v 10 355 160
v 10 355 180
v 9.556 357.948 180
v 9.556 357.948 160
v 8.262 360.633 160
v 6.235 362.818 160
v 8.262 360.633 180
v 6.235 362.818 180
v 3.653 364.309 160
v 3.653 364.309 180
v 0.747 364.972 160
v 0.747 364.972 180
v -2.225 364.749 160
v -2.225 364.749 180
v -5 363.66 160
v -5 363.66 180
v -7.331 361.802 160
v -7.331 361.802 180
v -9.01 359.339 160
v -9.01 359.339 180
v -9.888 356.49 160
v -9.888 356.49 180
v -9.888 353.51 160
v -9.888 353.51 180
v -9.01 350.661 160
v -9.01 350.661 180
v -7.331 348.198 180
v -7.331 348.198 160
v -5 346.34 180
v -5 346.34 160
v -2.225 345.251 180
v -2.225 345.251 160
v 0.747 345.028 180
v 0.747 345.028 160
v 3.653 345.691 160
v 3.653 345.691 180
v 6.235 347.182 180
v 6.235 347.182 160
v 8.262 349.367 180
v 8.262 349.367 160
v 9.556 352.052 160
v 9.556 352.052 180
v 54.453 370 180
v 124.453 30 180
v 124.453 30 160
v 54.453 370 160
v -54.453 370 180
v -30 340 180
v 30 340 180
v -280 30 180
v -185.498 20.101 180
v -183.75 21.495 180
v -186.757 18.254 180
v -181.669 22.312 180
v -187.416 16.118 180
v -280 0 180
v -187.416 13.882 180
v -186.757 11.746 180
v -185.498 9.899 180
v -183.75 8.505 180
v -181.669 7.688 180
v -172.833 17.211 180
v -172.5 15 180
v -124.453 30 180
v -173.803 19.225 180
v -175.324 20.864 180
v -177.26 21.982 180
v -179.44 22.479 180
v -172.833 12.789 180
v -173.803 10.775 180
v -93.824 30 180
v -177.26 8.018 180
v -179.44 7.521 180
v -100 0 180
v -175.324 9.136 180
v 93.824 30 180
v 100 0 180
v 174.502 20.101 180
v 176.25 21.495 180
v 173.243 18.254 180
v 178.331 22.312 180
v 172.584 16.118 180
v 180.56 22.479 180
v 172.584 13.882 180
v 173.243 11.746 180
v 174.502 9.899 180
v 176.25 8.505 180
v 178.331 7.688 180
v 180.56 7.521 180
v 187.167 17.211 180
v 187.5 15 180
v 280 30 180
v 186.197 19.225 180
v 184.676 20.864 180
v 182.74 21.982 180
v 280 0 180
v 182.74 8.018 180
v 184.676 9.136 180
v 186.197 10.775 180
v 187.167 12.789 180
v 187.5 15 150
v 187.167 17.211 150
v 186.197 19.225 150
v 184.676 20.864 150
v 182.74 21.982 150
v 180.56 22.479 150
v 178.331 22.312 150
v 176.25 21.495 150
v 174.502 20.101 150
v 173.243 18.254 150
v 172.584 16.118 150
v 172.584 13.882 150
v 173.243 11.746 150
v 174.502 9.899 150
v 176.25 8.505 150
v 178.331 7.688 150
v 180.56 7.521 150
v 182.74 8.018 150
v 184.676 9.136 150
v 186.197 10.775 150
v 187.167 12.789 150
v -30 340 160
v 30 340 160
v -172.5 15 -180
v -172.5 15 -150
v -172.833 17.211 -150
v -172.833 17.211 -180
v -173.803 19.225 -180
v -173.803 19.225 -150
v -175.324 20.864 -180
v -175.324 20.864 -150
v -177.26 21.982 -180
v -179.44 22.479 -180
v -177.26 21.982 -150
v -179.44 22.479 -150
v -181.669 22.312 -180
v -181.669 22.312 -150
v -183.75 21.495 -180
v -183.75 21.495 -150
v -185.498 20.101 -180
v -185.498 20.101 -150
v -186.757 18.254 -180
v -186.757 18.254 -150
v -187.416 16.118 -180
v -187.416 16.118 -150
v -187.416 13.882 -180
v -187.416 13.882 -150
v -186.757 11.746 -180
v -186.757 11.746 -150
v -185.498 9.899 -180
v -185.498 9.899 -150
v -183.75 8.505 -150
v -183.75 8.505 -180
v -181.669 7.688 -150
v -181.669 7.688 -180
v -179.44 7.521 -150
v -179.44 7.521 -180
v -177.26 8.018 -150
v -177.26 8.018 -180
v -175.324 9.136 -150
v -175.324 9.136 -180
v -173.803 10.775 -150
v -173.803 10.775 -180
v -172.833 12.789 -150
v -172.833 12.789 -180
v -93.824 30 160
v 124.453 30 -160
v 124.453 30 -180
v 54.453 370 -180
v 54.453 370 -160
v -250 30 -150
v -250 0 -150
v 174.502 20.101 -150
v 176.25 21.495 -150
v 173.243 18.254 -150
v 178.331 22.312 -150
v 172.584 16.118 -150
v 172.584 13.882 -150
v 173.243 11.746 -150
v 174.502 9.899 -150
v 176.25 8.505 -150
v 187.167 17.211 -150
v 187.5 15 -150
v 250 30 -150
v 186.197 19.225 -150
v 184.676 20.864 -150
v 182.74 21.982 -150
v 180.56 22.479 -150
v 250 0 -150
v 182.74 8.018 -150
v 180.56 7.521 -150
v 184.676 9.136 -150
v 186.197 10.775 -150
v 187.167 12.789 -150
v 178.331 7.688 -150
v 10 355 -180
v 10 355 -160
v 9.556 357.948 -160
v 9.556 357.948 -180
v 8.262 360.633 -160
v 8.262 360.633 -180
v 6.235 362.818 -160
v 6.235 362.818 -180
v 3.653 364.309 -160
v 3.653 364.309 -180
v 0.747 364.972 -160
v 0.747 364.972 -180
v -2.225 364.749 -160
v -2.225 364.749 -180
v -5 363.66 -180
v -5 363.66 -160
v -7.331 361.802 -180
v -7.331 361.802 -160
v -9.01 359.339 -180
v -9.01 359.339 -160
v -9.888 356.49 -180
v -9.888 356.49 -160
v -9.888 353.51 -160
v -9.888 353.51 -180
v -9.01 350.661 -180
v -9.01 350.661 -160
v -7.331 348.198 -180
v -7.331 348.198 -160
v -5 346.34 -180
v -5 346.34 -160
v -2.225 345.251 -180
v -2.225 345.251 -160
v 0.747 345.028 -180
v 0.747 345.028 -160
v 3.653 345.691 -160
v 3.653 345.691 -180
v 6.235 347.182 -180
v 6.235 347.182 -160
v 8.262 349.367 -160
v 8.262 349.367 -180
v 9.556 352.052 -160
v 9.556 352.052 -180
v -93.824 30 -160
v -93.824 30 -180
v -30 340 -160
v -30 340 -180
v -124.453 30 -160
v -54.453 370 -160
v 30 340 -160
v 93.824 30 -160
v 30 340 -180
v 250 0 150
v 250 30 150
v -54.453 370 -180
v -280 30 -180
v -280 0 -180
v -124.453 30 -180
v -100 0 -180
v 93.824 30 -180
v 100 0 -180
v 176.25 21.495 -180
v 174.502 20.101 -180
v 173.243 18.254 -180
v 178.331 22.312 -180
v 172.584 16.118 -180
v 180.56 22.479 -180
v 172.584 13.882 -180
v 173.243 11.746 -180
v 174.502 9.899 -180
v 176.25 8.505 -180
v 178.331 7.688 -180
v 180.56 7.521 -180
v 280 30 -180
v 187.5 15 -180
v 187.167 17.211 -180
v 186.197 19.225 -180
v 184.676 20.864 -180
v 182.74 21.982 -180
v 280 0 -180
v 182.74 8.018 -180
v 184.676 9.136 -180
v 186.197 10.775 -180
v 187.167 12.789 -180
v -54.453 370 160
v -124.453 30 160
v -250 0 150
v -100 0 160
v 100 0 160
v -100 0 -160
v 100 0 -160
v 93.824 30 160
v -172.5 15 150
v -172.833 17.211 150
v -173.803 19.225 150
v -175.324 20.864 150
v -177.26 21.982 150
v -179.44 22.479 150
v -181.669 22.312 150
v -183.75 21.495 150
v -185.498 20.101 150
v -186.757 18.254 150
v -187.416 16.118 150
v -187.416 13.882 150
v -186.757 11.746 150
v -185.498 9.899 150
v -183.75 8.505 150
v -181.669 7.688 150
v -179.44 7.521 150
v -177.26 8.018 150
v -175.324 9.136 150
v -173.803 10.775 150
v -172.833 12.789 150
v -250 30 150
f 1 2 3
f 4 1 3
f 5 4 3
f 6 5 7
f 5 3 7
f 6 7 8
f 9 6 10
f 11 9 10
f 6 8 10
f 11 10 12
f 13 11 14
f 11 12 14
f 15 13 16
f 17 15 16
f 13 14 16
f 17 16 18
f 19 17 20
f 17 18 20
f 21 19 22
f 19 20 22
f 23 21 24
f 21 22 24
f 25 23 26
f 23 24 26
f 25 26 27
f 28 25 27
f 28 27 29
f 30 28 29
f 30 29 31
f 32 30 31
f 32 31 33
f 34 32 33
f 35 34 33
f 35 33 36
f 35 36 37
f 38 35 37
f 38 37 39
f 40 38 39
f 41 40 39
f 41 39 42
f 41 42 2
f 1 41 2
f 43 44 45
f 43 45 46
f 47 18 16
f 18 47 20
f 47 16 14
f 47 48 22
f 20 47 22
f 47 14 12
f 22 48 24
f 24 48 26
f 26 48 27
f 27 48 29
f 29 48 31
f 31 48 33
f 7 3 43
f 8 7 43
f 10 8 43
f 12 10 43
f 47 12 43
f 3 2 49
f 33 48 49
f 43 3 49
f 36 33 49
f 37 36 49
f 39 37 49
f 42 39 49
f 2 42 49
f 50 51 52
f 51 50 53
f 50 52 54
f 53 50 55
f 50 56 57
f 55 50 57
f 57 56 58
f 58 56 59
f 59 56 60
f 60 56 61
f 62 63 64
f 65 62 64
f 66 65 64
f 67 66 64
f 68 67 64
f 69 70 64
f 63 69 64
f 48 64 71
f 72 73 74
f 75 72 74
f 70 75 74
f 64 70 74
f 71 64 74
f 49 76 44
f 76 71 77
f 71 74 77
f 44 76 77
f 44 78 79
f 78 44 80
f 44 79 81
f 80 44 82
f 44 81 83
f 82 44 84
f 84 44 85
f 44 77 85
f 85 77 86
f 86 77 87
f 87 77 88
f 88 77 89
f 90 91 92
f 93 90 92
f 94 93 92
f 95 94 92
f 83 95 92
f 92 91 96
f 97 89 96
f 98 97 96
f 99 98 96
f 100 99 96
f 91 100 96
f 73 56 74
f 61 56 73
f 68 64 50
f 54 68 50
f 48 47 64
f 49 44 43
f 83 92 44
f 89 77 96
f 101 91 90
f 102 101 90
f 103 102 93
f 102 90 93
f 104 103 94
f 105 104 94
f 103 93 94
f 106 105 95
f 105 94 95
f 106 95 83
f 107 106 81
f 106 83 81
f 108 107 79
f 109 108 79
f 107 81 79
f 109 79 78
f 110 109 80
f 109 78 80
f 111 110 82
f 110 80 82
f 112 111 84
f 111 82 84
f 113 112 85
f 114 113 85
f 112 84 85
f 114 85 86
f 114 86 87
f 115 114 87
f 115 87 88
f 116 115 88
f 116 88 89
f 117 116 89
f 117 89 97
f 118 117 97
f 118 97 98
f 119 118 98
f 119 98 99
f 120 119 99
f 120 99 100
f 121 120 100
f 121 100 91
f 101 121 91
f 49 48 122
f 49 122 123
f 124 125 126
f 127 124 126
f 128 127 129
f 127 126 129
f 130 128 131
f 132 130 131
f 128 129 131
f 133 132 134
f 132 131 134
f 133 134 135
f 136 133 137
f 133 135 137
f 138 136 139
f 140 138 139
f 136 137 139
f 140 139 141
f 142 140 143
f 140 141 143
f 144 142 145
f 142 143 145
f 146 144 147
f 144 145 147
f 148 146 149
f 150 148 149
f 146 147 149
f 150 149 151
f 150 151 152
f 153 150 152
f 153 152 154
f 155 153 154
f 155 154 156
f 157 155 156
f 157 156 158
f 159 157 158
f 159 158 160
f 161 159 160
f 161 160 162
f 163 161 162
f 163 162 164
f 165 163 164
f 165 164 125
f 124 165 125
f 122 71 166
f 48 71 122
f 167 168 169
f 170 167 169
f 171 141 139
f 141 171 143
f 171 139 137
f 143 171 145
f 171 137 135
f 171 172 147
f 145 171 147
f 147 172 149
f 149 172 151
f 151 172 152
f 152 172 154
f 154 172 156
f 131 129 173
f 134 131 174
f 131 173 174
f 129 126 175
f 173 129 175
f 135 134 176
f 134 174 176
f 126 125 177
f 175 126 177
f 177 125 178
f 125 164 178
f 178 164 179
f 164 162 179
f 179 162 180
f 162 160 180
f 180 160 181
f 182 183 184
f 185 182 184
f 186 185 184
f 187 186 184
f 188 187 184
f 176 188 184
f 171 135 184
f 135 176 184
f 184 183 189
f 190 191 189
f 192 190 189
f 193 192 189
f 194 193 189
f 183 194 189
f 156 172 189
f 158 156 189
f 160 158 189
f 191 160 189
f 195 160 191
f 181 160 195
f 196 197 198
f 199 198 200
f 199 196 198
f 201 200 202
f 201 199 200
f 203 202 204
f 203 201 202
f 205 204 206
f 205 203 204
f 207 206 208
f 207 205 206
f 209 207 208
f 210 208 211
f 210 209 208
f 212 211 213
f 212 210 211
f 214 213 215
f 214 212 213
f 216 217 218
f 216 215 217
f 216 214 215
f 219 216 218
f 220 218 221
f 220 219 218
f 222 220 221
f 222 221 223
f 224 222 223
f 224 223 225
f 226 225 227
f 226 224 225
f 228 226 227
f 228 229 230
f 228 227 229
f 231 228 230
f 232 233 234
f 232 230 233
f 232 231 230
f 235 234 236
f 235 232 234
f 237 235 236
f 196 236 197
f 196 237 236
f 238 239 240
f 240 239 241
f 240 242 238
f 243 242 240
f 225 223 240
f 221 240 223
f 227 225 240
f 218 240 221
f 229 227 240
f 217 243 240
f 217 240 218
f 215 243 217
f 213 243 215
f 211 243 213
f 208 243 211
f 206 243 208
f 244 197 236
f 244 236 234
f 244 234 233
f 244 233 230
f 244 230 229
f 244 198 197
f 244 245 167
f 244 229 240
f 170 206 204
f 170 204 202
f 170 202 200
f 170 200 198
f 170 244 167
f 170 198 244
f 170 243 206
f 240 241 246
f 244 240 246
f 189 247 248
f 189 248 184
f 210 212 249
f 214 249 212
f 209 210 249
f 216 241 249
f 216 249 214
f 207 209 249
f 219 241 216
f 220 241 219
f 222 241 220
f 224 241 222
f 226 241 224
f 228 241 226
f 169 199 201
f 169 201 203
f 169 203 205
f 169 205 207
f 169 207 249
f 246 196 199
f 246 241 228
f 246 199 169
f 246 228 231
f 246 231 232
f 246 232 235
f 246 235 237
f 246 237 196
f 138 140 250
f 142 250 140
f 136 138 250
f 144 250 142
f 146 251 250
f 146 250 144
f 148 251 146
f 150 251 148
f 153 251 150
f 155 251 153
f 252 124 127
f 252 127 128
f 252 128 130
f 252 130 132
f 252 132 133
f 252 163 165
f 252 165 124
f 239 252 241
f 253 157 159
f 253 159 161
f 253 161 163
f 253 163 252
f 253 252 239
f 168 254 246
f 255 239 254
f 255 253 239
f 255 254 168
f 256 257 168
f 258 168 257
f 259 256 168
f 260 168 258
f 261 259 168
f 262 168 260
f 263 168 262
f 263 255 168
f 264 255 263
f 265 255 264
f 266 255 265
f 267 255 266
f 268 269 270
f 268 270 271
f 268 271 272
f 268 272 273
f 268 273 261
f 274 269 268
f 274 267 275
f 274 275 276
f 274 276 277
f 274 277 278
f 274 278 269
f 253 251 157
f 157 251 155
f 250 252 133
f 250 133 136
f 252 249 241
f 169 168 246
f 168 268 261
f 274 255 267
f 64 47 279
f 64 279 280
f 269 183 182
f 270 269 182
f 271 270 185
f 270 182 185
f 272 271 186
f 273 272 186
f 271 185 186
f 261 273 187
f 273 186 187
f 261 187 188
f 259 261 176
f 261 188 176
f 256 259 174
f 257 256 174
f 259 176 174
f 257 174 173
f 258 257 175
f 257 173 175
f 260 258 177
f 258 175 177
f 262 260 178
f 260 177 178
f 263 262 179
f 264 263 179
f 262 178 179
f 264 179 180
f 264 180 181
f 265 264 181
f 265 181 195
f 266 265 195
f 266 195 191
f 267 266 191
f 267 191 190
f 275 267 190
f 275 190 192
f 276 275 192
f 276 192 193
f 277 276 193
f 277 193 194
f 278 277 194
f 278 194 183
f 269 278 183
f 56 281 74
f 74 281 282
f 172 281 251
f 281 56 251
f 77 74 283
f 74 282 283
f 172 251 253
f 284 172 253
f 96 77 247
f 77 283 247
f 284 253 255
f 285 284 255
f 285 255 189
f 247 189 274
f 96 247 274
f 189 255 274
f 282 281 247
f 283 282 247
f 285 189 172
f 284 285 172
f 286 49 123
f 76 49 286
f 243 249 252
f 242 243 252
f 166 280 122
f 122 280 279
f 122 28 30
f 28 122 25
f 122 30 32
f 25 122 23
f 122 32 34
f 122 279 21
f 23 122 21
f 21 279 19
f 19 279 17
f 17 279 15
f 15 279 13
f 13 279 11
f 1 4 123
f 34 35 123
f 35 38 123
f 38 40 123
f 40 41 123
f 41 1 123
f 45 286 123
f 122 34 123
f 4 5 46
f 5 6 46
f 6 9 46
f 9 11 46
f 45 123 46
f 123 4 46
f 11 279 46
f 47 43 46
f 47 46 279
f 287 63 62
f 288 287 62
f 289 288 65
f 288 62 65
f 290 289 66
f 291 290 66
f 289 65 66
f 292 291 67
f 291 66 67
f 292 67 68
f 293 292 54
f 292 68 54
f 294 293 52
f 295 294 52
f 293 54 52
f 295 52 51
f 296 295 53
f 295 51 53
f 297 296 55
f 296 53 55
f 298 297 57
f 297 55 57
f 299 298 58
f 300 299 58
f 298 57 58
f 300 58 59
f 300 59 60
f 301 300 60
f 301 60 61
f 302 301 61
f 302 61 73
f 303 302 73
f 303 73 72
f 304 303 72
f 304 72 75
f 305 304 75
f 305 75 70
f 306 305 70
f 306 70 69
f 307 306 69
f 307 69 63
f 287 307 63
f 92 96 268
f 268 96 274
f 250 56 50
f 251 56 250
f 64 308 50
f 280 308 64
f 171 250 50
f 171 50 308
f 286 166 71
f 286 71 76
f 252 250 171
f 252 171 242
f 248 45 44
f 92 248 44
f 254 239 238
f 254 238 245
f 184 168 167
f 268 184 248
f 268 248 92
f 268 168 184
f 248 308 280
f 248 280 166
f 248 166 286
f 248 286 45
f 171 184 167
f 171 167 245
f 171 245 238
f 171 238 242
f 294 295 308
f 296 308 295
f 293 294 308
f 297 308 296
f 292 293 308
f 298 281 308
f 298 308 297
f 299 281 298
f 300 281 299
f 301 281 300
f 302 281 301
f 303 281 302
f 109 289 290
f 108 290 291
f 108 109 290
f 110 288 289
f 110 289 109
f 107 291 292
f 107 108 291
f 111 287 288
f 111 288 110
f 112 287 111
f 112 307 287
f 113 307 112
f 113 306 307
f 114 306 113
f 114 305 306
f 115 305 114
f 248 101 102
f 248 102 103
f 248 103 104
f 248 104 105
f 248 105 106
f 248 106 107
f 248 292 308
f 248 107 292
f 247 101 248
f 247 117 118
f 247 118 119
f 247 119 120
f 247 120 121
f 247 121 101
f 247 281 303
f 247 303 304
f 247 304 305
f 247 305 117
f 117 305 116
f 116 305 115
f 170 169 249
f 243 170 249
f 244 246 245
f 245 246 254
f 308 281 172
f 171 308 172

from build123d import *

# Parameters (mm, degrees)
SKETCH1_W           = 560
SKETCH1_H           = 360
SKETCH1_W_2         = 500
SKETCH1_H_2         = 300
EXTRUDE_THIN1_DEPTH = 30
SKETCH2_R           = 7.5
CUT_EXTRUDE1_DEPTH  = 361
EXTRUDE_THIN2_DEPTH = 20
SKETCH4_R           = 10
CUT_EXTRUDE2_DEPTH  = 361


with BuildPart() as part:
    # Sketch1 → Extrude-Thin1 (new body)
    with BuildSketch(Plane(origin=(0, 0, 0), x_dir=(1, 0, 0), z_dir=(0, 1, 0))):
        Rectangle(SKETCH1_W, SKETCH1_H)
        Rectangle(SKETCH1_W_2, SKETCH1_H_2, mode=Mode.SUBTRACT)
    extrude(amount=EXTRUDE_THIN1_DEPTH)

    # Sketch2 → Cut-Extrude1 (cut, through all)
    with BuildSketch(Plane.XY.offset(180)):
        with Locations((-180, 15)):
            Circle(SKETCH2_R)
        with Locations((180, 15)):
            Circle(SKETCH2_R)
    extrude(amount=-CUT_EXTRUDE1_DEPTH, mode=Mode.SUBTRACT)

    # Sketch3 → Extrude-Thin2 (add)
    with BuildSketch(Plane.XY.offset(180)):
        Polygon((-100, 0), (-30, 340), (30, 340), (100, 0), (129.383711298, 6.04958762), (54.452744043, 370), (-54.452744043, 370), (-129.383711298, 6.04958762), align=None)
    extrude_thin2 = extrude(amount=-EXTRUDE_THIN2_DEPTH)

    # Sketch4 → Cut-Extrude2 (cut, through all)
    with BuildSketch(Plane.XY.offset(180)):
        with Locations((0, 355)):
            Circle(SKETCH4_R)
    cut_extrude2 = extrude(amount=-CUT_EXTRUDE2_DEPTH, mode=Mode.SUBTRACT)

    # Mirror1: Extrude-Thin2, Cut-Extrude2 across plane
    add(extrude_thin2.mirror(Plane.XY))
    add(cut_extrude2.mirror(Plane.XY), mode=Mode.SUBTRACT)


solid = part.part
